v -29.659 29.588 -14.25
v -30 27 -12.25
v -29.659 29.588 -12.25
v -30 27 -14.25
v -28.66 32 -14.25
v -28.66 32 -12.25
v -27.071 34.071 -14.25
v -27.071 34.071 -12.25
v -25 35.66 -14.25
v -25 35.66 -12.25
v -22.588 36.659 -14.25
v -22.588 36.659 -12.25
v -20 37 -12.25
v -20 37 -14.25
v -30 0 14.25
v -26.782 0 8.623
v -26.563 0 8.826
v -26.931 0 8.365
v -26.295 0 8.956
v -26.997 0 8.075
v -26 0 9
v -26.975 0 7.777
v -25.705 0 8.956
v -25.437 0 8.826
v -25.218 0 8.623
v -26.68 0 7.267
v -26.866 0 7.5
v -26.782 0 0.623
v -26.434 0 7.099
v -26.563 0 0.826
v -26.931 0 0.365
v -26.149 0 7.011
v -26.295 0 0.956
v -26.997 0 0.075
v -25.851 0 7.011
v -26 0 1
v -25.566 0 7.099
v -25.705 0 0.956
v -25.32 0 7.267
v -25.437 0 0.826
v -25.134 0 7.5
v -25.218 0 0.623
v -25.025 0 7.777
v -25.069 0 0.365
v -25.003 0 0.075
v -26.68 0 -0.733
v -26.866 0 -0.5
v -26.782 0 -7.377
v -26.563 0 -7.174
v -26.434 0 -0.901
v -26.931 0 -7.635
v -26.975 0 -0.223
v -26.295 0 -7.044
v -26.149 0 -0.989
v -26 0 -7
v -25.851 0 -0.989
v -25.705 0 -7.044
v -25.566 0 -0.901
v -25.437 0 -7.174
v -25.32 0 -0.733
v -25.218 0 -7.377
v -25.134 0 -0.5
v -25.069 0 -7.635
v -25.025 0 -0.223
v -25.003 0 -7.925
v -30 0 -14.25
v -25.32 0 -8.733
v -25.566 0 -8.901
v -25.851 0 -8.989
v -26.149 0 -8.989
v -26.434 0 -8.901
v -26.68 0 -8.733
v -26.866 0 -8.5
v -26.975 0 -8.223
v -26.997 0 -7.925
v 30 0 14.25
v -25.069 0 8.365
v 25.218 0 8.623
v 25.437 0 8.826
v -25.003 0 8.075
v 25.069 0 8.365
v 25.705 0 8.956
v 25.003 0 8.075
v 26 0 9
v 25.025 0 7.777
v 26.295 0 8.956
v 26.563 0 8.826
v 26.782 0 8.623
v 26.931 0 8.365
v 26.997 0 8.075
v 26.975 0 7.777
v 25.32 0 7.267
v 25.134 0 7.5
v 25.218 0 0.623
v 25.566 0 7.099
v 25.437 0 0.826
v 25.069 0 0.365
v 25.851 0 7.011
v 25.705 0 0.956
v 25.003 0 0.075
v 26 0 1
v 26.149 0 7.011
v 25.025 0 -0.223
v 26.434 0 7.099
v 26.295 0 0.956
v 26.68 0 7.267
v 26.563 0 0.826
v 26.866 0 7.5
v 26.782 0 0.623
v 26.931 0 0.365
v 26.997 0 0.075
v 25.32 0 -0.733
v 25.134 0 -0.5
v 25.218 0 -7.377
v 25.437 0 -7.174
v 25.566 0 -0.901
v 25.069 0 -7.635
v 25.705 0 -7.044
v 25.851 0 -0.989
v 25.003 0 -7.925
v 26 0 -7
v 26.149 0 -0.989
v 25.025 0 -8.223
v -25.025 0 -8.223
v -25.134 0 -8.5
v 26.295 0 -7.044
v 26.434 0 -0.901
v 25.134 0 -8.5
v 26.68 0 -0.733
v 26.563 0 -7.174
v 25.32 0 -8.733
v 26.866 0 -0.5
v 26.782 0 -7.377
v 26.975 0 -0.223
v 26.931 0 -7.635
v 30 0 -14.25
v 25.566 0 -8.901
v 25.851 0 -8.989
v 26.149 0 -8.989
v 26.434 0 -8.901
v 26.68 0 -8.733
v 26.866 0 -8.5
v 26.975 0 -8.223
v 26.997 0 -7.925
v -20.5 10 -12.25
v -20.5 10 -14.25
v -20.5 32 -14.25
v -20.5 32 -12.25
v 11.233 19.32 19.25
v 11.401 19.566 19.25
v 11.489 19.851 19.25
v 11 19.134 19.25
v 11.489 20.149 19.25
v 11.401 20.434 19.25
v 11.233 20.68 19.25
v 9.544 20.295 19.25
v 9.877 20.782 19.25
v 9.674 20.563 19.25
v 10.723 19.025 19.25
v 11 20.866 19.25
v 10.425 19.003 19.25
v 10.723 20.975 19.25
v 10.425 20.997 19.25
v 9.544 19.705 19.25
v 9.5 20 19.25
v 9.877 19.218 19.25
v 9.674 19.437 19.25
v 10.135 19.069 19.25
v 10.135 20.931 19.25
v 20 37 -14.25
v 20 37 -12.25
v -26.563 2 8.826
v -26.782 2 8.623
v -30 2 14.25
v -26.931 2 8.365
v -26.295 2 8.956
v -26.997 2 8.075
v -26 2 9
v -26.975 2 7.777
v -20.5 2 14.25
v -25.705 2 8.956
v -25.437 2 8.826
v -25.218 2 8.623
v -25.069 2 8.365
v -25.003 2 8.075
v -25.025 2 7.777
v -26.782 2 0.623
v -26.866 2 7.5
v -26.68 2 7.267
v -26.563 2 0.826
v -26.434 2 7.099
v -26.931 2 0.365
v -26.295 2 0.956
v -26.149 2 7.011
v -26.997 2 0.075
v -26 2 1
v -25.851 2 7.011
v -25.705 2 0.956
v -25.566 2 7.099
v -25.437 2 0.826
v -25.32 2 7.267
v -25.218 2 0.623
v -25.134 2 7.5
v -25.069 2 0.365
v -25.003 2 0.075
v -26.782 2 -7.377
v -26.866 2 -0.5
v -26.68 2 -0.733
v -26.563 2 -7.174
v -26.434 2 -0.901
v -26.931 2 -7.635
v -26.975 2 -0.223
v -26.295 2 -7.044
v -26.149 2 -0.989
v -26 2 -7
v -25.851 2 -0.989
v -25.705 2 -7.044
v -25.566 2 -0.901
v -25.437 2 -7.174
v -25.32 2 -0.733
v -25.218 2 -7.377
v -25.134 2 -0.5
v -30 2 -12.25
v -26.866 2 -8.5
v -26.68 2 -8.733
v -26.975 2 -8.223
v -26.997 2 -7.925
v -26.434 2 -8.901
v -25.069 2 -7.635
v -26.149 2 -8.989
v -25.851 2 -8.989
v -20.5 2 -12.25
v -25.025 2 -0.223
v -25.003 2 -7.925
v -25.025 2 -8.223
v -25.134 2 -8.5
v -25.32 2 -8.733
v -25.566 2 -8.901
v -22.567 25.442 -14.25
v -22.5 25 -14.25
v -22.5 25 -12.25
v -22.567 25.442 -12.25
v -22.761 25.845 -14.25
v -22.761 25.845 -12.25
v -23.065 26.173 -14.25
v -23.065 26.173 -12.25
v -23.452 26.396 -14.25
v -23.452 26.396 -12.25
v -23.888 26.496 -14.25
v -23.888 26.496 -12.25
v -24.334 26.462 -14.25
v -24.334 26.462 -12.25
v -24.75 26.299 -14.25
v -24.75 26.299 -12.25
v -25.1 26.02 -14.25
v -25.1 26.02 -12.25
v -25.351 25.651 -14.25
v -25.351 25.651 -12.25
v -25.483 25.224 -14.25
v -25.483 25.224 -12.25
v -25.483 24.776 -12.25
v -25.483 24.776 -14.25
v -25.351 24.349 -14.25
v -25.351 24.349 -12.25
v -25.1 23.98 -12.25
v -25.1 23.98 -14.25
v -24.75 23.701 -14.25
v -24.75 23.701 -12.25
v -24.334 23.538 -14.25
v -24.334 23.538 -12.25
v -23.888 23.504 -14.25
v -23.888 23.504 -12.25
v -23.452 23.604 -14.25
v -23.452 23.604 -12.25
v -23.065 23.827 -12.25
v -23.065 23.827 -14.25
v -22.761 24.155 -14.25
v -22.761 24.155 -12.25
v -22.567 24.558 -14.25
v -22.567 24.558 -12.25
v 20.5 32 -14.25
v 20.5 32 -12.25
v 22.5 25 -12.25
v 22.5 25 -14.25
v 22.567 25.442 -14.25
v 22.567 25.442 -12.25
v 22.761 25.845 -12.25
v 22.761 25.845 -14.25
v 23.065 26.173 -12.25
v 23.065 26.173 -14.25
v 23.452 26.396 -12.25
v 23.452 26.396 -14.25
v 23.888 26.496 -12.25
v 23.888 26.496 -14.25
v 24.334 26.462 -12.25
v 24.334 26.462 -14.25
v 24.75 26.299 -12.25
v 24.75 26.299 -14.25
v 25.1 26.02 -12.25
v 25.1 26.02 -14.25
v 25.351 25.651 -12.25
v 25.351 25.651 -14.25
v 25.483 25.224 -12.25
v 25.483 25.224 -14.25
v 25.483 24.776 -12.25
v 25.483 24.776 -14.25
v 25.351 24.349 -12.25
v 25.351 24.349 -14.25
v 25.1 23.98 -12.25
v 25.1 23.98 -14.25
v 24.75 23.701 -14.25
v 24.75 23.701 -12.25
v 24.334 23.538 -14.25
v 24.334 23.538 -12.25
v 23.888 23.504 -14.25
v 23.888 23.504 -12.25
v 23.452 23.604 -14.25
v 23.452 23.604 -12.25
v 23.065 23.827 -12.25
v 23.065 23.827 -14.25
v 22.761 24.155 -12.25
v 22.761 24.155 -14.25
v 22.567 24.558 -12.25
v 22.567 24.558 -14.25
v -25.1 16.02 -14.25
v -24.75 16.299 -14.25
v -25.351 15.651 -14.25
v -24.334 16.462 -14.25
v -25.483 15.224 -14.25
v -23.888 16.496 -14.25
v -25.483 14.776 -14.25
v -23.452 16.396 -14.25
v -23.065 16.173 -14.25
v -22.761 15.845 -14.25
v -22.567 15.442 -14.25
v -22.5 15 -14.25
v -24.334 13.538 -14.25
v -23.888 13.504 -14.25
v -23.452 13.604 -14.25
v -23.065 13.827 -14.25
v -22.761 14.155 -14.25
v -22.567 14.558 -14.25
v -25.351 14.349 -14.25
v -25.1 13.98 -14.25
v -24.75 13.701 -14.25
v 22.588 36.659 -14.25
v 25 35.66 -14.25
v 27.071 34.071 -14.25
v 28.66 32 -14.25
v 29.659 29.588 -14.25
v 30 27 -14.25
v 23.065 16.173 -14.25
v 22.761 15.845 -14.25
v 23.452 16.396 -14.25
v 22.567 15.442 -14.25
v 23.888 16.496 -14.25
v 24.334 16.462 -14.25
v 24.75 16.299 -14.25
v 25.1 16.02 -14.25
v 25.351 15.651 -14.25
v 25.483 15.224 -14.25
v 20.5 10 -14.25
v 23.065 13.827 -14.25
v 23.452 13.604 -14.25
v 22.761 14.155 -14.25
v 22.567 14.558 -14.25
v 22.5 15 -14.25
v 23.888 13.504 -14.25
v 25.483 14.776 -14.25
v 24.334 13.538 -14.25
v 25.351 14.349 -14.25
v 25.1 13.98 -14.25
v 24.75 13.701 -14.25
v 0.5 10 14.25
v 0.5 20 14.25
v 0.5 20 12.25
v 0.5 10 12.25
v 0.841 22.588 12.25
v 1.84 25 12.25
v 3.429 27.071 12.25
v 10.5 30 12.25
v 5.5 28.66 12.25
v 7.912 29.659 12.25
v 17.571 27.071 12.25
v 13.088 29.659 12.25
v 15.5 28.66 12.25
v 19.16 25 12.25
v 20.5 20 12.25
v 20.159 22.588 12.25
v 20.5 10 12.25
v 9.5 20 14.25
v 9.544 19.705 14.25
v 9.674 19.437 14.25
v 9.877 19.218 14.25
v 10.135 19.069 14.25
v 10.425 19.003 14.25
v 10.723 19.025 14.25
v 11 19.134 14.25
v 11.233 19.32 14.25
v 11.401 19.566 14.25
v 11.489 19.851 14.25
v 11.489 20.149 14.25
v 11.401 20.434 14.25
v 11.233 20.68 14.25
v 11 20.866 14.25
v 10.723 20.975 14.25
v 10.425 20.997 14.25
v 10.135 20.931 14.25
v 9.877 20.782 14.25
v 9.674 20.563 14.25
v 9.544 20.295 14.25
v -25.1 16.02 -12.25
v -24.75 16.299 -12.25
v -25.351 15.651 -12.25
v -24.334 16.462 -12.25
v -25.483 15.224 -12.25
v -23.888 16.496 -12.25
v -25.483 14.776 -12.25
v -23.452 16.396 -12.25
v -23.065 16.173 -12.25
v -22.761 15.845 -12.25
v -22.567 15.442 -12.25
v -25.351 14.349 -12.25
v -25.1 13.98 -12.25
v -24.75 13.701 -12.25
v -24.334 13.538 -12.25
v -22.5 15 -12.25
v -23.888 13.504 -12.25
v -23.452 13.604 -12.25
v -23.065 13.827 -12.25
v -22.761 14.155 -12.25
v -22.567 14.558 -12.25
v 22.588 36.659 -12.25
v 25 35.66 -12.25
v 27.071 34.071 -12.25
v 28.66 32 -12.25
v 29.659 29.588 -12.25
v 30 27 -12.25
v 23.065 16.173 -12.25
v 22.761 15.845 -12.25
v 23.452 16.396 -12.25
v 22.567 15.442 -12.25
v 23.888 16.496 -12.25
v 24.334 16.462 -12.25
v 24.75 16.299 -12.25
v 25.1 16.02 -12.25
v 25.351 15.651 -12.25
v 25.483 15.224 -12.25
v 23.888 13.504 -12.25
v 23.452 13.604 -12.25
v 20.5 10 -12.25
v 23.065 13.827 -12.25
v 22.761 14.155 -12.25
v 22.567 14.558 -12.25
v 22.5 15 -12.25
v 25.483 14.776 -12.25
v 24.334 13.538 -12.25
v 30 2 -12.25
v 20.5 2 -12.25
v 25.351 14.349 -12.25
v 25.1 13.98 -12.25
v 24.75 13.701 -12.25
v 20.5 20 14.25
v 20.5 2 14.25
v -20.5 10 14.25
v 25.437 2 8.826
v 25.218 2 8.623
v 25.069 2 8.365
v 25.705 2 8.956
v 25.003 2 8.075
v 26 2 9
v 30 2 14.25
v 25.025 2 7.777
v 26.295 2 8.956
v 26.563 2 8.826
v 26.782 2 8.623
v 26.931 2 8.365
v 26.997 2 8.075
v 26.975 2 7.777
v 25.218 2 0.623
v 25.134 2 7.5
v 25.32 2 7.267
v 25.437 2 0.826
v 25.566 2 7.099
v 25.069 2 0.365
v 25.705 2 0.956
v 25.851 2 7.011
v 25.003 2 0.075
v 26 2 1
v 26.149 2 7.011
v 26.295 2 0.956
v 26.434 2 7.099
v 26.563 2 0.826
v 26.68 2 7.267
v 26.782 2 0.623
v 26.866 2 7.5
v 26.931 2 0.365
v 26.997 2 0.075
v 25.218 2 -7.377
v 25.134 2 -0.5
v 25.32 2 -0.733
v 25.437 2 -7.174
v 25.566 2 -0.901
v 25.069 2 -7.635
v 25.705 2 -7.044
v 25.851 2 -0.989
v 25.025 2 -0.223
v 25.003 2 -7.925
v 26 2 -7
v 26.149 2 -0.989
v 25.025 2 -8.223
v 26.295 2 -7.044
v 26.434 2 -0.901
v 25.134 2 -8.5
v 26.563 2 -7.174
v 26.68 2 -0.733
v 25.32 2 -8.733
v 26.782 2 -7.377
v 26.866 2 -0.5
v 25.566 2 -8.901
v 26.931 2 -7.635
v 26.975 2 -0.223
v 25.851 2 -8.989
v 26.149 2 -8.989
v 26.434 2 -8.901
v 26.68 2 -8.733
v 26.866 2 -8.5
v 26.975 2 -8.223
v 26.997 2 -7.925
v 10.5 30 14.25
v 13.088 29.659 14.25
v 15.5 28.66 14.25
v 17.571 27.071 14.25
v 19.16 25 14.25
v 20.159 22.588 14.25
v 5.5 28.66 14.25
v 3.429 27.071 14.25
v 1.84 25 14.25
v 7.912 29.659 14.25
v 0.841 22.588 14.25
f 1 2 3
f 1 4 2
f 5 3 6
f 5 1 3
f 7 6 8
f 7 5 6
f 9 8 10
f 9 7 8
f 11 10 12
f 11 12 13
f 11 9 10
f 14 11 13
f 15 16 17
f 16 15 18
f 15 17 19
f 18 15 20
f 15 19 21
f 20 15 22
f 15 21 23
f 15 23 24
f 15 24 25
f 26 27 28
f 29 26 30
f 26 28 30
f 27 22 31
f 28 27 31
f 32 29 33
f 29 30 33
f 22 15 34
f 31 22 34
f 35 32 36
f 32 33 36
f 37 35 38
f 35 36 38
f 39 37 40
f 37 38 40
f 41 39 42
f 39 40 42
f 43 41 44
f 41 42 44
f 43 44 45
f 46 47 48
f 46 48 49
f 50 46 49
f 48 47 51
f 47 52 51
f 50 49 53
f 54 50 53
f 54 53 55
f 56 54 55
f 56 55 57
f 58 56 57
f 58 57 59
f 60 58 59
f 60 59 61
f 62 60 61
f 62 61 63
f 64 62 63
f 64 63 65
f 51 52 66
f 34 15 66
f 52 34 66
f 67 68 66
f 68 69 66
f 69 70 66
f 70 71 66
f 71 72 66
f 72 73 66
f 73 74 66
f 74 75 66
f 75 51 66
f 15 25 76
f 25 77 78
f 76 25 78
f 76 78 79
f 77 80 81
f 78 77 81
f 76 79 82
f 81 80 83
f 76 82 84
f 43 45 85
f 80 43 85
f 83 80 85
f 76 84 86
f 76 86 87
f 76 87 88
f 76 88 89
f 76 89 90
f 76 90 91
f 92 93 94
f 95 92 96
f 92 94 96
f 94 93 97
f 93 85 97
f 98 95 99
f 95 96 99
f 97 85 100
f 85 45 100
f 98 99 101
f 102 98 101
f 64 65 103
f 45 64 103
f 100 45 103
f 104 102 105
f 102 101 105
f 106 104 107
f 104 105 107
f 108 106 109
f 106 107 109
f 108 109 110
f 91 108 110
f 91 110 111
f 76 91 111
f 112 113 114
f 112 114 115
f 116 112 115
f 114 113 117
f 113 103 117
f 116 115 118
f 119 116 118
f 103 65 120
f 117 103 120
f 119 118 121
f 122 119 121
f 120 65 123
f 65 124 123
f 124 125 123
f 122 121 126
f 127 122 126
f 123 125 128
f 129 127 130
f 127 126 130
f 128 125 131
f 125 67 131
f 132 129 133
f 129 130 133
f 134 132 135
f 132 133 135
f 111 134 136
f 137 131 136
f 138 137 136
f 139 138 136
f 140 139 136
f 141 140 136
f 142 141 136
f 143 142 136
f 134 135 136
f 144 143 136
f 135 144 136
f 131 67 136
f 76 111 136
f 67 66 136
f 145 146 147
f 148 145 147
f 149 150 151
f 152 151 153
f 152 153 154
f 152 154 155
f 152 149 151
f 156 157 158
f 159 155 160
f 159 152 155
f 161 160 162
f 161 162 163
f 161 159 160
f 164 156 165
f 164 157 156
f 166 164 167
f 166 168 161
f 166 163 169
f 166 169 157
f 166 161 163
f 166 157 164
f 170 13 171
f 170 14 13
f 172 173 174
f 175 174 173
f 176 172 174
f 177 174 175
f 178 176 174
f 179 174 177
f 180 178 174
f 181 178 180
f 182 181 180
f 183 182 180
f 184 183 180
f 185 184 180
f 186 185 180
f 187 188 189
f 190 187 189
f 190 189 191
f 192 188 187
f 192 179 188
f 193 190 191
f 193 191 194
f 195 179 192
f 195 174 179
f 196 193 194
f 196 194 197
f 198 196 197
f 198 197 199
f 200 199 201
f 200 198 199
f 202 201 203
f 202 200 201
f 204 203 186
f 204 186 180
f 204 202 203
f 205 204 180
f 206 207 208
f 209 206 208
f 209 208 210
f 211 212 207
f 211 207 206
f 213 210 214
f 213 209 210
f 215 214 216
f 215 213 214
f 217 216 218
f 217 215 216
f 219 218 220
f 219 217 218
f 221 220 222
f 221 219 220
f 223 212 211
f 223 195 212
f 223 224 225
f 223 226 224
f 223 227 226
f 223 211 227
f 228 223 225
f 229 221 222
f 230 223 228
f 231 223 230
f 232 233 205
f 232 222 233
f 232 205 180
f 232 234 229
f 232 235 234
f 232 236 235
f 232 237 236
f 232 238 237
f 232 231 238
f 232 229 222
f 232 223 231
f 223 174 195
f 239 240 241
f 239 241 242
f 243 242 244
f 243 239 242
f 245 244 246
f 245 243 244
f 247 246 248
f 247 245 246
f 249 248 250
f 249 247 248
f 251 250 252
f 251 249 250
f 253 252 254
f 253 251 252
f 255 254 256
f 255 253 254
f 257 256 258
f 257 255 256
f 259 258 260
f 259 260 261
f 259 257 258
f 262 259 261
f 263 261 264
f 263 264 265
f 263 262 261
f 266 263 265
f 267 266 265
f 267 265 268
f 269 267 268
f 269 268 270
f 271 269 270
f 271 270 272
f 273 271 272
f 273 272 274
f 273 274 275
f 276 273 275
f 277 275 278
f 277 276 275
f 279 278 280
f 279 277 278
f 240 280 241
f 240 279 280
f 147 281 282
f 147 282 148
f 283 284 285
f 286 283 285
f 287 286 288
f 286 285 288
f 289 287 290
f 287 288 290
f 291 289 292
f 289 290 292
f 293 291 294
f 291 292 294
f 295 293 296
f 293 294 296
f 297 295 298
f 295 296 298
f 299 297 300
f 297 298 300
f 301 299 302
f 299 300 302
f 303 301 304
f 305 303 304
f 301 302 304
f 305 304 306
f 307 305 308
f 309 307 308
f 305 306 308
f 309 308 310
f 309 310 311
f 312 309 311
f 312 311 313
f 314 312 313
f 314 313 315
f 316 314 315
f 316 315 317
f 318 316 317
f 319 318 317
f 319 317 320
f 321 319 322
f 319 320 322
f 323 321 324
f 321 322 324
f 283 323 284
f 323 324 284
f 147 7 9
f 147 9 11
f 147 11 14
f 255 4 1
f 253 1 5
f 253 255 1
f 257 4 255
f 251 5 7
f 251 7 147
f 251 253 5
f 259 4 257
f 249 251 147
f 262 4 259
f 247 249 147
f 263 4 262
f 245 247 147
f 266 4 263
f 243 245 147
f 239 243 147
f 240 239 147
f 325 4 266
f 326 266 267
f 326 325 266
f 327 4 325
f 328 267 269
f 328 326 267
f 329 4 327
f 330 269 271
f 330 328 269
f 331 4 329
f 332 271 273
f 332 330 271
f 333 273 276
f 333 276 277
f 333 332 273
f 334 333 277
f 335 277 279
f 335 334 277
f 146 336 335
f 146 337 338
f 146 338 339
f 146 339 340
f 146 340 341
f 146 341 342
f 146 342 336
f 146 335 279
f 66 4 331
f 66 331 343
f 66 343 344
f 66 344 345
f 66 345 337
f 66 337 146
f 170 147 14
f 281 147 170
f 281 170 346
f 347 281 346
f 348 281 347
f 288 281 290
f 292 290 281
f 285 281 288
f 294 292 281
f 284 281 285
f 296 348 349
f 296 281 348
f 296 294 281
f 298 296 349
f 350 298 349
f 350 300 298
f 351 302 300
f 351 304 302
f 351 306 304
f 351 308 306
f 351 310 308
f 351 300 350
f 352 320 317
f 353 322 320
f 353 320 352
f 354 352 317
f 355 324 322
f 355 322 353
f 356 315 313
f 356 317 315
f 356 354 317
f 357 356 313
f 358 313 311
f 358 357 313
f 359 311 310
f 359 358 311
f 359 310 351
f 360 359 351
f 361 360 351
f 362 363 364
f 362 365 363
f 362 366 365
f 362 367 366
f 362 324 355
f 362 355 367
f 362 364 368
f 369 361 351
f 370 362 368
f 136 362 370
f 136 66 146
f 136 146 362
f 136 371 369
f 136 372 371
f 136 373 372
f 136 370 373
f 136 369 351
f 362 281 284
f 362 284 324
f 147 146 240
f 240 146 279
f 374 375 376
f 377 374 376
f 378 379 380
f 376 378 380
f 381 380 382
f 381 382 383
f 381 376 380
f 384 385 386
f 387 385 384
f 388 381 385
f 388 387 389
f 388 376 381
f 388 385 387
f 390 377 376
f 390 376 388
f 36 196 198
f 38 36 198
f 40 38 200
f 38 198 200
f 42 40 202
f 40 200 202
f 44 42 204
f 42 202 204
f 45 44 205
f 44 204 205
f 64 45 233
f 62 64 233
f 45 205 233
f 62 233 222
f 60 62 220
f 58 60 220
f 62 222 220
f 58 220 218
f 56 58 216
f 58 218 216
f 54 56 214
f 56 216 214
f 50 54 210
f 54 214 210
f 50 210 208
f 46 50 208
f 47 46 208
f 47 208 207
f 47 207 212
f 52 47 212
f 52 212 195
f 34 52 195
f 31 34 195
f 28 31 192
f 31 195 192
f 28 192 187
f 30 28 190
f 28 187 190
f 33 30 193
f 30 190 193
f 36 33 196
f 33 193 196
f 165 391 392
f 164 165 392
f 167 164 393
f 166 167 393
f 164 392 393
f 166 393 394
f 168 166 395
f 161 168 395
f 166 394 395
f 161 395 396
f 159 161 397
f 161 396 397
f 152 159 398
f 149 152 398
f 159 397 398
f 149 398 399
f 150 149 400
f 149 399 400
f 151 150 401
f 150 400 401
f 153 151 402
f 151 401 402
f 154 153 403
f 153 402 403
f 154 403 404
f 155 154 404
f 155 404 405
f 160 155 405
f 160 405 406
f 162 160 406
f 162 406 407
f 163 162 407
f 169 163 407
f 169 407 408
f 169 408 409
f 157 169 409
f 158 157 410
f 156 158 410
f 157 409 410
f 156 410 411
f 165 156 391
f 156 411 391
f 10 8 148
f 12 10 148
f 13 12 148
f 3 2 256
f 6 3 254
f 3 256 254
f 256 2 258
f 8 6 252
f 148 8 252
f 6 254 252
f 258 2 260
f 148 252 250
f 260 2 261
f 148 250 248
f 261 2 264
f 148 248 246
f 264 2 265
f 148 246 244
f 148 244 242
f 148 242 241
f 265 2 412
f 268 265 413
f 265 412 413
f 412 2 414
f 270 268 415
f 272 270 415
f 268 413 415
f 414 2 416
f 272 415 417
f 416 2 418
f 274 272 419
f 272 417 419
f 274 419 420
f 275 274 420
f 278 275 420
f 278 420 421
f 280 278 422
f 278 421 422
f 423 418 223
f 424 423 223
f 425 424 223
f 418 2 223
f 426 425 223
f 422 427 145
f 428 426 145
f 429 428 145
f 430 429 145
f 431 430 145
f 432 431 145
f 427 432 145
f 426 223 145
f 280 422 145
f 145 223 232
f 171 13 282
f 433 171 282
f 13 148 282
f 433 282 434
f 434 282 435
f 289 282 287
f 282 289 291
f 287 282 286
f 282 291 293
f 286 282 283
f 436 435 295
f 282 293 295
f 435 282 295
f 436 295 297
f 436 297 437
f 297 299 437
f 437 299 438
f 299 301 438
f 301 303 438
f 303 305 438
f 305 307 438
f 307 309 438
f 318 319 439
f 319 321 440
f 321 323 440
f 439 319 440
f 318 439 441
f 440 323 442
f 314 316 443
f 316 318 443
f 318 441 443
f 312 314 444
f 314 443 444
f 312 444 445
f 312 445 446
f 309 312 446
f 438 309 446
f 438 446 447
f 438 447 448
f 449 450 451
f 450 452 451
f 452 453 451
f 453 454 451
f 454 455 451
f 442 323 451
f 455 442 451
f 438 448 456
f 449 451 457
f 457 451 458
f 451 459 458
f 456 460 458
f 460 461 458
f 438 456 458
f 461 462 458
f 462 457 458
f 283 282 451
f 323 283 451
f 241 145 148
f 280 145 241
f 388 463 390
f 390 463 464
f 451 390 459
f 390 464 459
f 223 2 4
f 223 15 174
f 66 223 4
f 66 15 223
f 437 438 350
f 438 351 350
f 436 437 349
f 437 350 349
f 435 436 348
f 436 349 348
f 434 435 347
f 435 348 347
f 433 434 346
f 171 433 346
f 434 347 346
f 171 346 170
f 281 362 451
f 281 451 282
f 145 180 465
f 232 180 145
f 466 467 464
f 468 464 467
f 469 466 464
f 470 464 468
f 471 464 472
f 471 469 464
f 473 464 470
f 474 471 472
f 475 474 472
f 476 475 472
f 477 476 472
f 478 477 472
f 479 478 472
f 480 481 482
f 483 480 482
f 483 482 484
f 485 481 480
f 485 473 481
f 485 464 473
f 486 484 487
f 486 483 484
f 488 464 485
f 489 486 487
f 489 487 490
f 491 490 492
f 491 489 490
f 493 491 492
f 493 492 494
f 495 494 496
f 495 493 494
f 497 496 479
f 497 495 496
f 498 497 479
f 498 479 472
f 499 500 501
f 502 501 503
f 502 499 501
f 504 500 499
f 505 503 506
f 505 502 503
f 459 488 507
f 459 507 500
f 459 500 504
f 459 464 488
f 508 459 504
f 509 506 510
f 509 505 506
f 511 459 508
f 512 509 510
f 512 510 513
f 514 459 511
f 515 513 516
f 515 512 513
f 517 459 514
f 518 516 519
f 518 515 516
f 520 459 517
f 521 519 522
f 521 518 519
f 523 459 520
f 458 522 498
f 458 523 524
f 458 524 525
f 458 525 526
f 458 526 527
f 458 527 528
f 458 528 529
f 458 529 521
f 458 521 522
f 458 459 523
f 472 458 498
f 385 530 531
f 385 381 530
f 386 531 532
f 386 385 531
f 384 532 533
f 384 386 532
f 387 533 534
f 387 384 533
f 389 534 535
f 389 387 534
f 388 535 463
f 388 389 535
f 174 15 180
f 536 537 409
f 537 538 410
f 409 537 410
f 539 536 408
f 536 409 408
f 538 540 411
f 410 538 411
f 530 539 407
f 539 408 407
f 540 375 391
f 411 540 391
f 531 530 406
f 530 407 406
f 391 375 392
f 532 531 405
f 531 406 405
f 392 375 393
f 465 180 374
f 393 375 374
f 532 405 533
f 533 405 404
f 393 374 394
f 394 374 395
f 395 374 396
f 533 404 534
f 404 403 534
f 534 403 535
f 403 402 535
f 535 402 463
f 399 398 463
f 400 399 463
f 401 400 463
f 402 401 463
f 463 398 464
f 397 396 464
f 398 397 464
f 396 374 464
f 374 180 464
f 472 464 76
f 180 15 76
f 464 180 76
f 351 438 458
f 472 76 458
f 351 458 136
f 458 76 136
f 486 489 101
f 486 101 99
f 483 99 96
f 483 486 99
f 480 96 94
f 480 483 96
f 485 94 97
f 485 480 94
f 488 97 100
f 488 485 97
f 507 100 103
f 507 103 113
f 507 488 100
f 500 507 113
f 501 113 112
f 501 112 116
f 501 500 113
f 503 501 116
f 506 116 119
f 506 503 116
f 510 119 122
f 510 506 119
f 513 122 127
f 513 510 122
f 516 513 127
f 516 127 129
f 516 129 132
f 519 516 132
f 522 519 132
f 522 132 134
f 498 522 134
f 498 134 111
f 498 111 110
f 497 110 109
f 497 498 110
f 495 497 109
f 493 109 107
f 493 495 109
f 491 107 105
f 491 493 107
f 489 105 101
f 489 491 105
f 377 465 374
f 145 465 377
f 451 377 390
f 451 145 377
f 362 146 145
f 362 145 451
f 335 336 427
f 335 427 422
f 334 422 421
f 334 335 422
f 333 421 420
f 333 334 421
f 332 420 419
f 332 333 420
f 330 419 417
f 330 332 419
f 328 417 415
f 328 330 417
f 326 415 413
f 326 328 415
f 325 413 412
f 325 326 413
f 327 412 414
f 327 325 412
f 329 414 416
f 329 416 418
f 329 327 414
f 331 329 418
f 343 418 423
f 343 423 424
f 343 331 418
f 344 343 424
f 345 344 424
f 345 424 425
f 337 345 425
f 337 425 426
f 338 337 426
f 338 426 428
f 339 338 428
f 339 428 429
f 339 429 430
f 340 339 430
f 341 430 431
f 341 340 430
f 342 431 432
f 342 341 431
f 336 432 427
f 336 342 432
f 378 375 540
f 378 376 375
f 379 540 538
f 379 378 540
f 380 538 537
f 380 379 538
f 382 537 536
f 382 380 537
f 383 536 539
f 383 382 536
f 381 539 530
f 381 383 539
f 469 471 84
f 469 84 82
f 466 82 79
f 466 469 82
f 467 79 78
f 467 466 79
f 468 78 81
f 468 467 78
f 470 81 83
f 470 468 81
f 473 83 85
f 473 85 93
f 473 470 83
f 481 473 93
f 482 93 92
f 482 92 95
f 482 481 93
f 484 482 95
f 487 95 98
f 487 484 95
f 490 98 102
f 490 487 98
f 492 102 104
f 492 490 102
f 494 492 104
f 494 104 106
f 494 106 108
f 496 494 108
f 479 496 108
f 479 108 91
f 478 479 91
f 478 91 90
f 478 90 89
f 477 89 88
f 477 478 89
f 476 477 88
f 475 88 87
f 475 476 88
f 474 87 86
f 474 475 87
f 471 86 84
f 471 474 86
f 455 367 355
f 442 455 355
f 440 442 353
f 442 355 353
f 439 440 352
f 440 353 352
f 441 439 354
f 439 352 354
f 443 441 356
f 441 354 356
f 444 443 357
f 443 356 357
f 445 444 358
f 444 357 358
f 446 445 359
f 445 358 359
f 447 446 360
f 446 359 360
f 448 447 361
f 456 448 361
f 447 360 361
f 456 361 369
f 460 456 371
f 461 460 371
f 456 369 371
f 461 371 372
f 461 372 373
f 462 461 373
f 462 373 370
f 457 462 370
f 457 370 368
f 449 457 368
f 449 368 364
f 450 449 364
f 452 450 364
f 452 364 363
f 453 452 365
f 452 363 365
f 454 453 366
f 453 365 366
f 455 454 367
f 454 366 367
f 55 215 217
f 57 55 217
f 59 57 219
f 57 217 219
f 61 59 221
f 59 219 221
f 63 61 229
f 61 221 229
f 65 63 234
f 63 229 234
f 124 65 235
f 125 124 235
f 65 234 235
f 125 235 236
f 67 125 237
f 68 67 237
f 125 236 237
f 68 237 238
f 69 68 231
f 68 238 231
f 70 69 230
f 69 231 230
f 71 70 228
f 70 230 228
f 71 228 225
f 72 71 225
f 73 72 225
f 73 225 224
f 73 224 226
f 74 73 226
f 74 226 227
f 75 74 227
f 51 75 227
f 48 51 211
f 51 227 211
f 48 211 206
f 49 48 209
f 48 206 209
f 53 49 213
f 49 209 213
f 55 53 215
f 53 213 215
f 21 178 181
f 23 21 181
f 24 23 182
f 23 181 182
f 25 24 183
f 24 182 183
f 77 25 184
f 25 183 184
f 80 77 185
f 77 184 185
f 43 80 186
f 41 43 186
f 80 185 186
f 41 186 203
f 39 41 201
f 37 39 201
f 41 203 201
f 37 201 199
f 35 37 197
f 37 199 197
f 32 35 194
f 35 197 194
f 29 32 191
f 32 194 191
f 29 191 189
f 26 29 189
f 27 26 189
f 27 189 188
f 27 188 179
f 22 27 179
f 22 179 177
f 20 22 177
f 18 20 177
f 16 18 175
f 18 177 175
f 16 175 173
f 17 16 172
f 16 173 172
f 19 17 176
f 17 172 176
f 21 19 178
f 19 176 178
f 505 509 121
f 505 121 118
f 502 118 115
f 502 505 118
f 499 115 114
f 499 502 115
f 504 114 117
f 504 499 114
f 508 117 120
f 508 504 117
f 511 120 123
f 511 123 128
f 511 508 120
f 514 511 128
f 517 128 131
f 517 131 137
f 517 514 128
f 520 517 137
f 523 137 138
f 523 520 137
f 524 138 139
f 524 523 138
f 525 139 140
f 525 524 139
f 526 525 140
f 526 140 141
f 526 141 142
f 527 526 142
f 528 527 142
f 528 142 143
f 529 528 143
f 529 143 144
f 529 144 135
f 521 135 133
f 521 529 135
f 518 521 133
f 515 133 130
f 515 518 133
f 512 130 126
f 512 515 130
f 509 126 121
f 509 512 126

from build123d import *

# Parameters (mm, degrees)
SKETCH1_W           = 60
SKETCH1_H           = 28.5
BOSS_EXTRUDE1_DEPTH = 2
SKETCH2_W           = 60
SKETCH2_H           = 2
BOSS_EXTRUDE2_DEPTH = 35
SKETCH3_W           = 41
SKETCH3_H           = 28.5
BOSS_EXTRUDE3_DEPTH = 8
SKETCH4_W           = 20
SKETCH4_H           = 2
BOSS_EXTRUDE4_DEPTH = 20
SKETCH5_W           = 41
SKETCH5_H           = 22
CUT_EXTRUDE1_DEPTH  = 2
SKETCH6_R           = 1.5
CUT_EXTRUDE2_DEPTH  = 2
SKETCH7_R           = 1
BOSS_EXTRUDE5_DEPTH = 5
FILLET1_R           = 10
FILLET2_R           = 10
SKETCH8_R           = 1
CUT_EXTRUDE3_DEPTH  = 2


with BuildPart() as part:
    # Sketch1 → Boss-Extrude1 (new body)
    with BuildSketch(Plane(origin=(0, 0, 0), x_dir=(1, 0, 0), z_dir=(0, 1, 0))):
        Rectangle(SKETCH1_W, SKETCH1_H)
    extrude(amount=BOSS_EXTRUDE1_DEPTH)

    # Sketch2 → Boss-Extrude2 (add)
    with BuildSketch(Plane(origin=(0, 2, 0), x_dir=(1, 0, 0), z_dir=(0, 1, 0))):
        with Locations((0, 13.25)):
            Rectangle(SKETCH2_W, SKETCH2_H)
    extrude(amount=BOSS_EXTRUDE2_DEPTH)

    # Sketch3 → Boss-Extrude3 (add)
    with BuildSketch(Plane(origin=(0, 2, 0), x_dir=(1, 0, 0), z_dir=(0, 1, 0))):
        Rectangle(SKETCH3_W, SKETCH3_H)
    extrude(amount=BOSS_EXTRUDE3_DEPTH)

    # Sketch4 → Boss-Extrude4 (add)
    with BuildSketch(Plane(origin=(0, 10, 0), x_dir=(1, 0, 0), z_dir=(0, 1, 0))):
        with Locations((10.5, -13.25)):
            Rectangle(SKETCH4_W, SKETCH4_H)
    extrude(amount=BOSS_EXTRUDE4_DEPTH)

    # Sketch5 → Cut-Extrude1 (cut)
    with BuildSketch(Plane(origin=(0, 0, -14.25), x_dir=(-1, 0, 0), z_dir=(0, 0, -1))):
        with Locations((0, 21)):
            Rectangle(SKETCH5_W, SKETCH5_H)
    extrude(amount=-CUT_EXTRUDE1_DEPTH, mode=Mode.SUBTRACT)

    # Sketch6 → Cut-Extrude2 (cut)
    with BuildSketch(Plane(origin=(0, 0, -14.25), x_dir=(-1, 0, 0), z_dir=(0, 0, -1))):
        with Locations((-24, 25)):
            Circle(SKETCH6_R)
        with Locations((-24, 15)):
            Circle(SKETCH6_R)
    cut_extrude2 = extrude(amount=-CUT_EXTRUDE2_DEPTH, mode=Mode.SUBTRACT)

    # Mirror1: Cut-Extrude2 across plane
    add(cut_extrude2.mirror(Plane(origin=(0, 0, 0), x_dir=(0, 0, 1), z_dir=(1, 0, 0))), mode=Mode.SUBTRACT)

    # Sketch7 → Boss-Extrude5 (add)
    with BuildSketch(Plane.XY.offset(14.25)):
        with Locations(Location((10.5, 20, 0), (0, 0, 180))):
            Circle(SKETCH7_R)
    extrude(amount=BOSS_EXTRUDE5_DEPTH)

    # Fillet1
    fillet1_edges = [part.edges().sort_by_distance(p)[0] for p in [
        (0.5, 30, 13.25),
        (20.5, 30, 13.25),
    ]]
    fillet(fillet1_edges, radius=FILLET1_R - 0.0001)  # a hair under: the kernel refuses the full size

    # Fillet2
    fillet2_edges = [part.edges().sort_by_distance(p)[0] for p in [
        (-30, 37, -13.25),
        (30, 37, -13.25),
    ]]
    fillet(fillet2_edges, radius=FILLET2_R)

    # Sketch8 → Cut-Extrude3 (cut)
    with BuildSketch(Plane(origin=(0, 2, 0), x_dir=(1, 0, 0), z_dir=(0, 1, 0))):
        with Locations(Location((-26, 0, 0), (0, 0, 270))):
            Circle(SKETCH8_R)
        with Locations(Location((-26, 8, 0), (0, 0, 270))):
            Circle(SKETCH8_R)
        with Locations(Location((-26, -8, 0), (0, 0, 270))):
            Circle(SKETCH8_R)
    cut_extrude3 = extrude(amount=-CUT_EXTRUDE3_DEPTH, mode=Mode.SUBTRACT)

    # Mirror2: Cut-Extrude3 across plane
    add(cut_extrude3.mirror(Plane(origin=(0, 0, 0), x_dir=(0, 0, 1), z_dir=(1, 0, 0))), mode=Mode.SUBTRACT)


solid = part.part
